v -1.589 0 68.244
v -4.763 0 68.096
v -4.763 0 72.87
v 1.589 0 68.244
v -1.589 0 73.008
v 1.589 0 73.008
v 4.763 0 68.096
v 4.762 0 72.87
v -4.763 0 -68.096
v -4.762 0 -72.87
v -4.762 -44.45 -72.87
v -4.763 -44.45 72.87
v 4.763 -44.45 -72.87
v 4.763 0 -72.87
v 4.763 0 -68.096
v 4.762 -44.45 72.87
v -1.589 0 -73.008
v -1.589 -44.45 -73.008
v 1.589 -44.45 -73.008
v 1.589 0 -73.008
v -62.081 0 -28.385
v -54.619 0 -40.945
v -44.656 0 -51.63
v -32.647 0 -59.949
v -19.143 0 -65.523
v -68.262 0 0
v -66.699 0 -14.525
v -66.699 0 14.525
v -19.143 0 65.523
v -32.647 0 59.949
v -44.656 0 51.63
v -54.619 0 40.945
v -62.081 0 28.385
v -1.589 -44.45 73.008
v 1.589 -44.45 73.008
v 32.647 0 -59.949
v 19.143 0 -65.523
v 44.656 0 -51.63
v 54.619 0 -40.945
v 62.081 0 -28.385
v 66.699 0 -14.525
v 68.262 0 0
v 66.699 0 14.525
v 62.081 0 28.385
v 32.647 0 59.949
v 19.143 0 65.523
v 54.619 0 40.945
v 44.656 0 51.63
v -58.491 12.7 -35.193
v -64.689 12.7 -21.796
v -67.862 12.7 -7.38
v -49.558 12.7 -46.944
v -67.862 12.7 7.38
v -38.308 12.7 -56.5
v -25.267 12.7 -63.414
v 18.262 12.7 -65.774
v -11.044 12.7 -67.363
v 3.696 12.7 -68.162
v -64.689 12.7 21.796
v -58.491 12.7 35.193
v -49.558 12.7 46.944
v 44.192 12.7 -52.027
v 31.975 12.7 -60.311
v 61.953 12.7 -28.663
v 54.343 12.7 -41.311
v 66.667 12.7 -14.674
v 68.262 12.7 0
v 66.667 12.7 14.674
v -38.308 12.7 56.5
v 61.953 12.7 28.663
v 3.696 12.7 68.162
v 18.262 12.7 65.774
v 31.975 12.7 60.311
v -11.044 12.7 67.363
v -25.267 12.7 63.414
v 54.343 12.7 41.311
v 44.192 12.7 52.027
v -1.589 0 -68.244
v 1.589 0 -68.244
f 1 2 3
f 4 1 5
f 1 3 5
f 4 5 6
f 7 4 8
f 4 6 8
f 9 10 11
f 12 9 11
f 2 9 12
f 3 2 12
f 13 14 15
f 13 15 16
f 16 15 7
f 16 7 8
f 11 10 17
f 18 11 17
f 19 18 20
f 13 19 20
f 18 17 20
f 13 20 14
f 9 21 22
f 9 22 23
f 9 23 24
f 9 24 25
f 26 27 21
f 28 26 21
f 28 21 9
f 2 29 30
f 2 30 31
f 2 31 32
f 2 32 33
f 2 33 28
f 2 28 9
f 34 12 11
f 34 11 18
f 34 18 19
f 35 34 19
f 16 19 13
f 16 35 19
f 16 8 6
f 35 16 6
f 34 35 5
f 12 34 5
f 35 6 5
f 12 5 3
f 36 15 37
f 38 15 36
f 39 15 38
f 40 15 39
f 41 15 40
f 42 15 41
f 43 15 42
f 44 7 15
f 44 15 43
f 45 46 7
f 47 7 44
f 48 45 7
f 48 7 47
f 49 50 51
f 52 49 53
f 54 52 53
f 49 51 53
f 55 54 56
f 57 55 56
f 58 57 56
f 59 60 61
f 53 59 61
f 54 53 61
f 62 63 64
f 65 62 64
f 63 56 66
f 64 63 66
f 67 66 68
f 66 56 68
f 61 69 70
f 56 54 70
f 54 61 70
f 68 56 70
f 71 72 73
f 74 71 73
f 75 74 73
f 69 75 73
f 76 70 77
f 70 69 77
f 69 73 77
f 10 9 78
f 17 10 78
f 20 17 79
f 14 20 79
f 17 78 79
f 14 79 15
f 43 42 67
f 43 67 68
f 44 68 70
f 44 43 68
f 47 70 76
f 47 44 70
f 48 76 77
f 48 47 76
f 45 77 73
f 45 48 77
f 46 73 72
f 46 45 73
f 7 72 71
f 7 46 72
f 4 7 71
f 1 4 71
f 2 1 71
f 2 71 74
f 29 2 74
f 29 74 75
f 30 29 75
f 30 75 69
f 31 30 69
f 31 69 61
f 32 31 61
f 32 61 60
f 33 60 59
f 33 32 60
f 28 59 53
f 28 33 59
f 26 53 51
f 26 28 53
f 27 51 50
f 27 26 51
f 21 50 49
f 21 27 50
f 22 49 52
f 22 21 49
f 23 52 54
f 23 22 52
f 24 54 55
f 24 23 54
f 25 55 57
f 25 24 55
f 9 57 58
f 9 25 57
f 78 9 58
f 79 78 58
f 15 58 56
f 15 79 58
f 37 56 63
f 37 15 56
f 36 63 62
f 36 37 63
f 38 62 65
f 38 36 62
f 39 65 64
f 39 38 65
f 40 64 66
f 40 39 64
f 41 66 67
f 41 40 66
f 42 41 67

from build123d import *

# Parameters (mm, degrees)
F0_W     = 9.525
F0_H     = 145.739072
F2_DEPTH = 44.45
F1_R     = 68.2625
F3_DEPTH = 12.7


with BuildPart() as f2:
    # F0 (on Front) → F2 (new body)
    with BuildSketch(Plane.XZ):
        with BuildLine():
            Line((-4.7625, 72.869536), (4.7625, 72.869536))
            ThreePointArc((4.7625, 72.869536), (0, 73.025), (-4.7625, 72.869536))
        make_face()
        with BuildLine():
            ThreePointArc((-4.7625, -72.869536), (0, -73.025), (4.7625, -72.869536))
            Line((4.7625, -72.869536), (-4.7625, -72.869536))
        make_face()
        Rectangle(F0_W, F0_H)
    extrude(amount=F2_DEPTH)

    # F1 (on Front) → F3 (join)
    with BuildSketch(Plane.XZ):
        Circle(F1_R)
    extrude(amount=-F3_DEPTH)


solid = f2.part
